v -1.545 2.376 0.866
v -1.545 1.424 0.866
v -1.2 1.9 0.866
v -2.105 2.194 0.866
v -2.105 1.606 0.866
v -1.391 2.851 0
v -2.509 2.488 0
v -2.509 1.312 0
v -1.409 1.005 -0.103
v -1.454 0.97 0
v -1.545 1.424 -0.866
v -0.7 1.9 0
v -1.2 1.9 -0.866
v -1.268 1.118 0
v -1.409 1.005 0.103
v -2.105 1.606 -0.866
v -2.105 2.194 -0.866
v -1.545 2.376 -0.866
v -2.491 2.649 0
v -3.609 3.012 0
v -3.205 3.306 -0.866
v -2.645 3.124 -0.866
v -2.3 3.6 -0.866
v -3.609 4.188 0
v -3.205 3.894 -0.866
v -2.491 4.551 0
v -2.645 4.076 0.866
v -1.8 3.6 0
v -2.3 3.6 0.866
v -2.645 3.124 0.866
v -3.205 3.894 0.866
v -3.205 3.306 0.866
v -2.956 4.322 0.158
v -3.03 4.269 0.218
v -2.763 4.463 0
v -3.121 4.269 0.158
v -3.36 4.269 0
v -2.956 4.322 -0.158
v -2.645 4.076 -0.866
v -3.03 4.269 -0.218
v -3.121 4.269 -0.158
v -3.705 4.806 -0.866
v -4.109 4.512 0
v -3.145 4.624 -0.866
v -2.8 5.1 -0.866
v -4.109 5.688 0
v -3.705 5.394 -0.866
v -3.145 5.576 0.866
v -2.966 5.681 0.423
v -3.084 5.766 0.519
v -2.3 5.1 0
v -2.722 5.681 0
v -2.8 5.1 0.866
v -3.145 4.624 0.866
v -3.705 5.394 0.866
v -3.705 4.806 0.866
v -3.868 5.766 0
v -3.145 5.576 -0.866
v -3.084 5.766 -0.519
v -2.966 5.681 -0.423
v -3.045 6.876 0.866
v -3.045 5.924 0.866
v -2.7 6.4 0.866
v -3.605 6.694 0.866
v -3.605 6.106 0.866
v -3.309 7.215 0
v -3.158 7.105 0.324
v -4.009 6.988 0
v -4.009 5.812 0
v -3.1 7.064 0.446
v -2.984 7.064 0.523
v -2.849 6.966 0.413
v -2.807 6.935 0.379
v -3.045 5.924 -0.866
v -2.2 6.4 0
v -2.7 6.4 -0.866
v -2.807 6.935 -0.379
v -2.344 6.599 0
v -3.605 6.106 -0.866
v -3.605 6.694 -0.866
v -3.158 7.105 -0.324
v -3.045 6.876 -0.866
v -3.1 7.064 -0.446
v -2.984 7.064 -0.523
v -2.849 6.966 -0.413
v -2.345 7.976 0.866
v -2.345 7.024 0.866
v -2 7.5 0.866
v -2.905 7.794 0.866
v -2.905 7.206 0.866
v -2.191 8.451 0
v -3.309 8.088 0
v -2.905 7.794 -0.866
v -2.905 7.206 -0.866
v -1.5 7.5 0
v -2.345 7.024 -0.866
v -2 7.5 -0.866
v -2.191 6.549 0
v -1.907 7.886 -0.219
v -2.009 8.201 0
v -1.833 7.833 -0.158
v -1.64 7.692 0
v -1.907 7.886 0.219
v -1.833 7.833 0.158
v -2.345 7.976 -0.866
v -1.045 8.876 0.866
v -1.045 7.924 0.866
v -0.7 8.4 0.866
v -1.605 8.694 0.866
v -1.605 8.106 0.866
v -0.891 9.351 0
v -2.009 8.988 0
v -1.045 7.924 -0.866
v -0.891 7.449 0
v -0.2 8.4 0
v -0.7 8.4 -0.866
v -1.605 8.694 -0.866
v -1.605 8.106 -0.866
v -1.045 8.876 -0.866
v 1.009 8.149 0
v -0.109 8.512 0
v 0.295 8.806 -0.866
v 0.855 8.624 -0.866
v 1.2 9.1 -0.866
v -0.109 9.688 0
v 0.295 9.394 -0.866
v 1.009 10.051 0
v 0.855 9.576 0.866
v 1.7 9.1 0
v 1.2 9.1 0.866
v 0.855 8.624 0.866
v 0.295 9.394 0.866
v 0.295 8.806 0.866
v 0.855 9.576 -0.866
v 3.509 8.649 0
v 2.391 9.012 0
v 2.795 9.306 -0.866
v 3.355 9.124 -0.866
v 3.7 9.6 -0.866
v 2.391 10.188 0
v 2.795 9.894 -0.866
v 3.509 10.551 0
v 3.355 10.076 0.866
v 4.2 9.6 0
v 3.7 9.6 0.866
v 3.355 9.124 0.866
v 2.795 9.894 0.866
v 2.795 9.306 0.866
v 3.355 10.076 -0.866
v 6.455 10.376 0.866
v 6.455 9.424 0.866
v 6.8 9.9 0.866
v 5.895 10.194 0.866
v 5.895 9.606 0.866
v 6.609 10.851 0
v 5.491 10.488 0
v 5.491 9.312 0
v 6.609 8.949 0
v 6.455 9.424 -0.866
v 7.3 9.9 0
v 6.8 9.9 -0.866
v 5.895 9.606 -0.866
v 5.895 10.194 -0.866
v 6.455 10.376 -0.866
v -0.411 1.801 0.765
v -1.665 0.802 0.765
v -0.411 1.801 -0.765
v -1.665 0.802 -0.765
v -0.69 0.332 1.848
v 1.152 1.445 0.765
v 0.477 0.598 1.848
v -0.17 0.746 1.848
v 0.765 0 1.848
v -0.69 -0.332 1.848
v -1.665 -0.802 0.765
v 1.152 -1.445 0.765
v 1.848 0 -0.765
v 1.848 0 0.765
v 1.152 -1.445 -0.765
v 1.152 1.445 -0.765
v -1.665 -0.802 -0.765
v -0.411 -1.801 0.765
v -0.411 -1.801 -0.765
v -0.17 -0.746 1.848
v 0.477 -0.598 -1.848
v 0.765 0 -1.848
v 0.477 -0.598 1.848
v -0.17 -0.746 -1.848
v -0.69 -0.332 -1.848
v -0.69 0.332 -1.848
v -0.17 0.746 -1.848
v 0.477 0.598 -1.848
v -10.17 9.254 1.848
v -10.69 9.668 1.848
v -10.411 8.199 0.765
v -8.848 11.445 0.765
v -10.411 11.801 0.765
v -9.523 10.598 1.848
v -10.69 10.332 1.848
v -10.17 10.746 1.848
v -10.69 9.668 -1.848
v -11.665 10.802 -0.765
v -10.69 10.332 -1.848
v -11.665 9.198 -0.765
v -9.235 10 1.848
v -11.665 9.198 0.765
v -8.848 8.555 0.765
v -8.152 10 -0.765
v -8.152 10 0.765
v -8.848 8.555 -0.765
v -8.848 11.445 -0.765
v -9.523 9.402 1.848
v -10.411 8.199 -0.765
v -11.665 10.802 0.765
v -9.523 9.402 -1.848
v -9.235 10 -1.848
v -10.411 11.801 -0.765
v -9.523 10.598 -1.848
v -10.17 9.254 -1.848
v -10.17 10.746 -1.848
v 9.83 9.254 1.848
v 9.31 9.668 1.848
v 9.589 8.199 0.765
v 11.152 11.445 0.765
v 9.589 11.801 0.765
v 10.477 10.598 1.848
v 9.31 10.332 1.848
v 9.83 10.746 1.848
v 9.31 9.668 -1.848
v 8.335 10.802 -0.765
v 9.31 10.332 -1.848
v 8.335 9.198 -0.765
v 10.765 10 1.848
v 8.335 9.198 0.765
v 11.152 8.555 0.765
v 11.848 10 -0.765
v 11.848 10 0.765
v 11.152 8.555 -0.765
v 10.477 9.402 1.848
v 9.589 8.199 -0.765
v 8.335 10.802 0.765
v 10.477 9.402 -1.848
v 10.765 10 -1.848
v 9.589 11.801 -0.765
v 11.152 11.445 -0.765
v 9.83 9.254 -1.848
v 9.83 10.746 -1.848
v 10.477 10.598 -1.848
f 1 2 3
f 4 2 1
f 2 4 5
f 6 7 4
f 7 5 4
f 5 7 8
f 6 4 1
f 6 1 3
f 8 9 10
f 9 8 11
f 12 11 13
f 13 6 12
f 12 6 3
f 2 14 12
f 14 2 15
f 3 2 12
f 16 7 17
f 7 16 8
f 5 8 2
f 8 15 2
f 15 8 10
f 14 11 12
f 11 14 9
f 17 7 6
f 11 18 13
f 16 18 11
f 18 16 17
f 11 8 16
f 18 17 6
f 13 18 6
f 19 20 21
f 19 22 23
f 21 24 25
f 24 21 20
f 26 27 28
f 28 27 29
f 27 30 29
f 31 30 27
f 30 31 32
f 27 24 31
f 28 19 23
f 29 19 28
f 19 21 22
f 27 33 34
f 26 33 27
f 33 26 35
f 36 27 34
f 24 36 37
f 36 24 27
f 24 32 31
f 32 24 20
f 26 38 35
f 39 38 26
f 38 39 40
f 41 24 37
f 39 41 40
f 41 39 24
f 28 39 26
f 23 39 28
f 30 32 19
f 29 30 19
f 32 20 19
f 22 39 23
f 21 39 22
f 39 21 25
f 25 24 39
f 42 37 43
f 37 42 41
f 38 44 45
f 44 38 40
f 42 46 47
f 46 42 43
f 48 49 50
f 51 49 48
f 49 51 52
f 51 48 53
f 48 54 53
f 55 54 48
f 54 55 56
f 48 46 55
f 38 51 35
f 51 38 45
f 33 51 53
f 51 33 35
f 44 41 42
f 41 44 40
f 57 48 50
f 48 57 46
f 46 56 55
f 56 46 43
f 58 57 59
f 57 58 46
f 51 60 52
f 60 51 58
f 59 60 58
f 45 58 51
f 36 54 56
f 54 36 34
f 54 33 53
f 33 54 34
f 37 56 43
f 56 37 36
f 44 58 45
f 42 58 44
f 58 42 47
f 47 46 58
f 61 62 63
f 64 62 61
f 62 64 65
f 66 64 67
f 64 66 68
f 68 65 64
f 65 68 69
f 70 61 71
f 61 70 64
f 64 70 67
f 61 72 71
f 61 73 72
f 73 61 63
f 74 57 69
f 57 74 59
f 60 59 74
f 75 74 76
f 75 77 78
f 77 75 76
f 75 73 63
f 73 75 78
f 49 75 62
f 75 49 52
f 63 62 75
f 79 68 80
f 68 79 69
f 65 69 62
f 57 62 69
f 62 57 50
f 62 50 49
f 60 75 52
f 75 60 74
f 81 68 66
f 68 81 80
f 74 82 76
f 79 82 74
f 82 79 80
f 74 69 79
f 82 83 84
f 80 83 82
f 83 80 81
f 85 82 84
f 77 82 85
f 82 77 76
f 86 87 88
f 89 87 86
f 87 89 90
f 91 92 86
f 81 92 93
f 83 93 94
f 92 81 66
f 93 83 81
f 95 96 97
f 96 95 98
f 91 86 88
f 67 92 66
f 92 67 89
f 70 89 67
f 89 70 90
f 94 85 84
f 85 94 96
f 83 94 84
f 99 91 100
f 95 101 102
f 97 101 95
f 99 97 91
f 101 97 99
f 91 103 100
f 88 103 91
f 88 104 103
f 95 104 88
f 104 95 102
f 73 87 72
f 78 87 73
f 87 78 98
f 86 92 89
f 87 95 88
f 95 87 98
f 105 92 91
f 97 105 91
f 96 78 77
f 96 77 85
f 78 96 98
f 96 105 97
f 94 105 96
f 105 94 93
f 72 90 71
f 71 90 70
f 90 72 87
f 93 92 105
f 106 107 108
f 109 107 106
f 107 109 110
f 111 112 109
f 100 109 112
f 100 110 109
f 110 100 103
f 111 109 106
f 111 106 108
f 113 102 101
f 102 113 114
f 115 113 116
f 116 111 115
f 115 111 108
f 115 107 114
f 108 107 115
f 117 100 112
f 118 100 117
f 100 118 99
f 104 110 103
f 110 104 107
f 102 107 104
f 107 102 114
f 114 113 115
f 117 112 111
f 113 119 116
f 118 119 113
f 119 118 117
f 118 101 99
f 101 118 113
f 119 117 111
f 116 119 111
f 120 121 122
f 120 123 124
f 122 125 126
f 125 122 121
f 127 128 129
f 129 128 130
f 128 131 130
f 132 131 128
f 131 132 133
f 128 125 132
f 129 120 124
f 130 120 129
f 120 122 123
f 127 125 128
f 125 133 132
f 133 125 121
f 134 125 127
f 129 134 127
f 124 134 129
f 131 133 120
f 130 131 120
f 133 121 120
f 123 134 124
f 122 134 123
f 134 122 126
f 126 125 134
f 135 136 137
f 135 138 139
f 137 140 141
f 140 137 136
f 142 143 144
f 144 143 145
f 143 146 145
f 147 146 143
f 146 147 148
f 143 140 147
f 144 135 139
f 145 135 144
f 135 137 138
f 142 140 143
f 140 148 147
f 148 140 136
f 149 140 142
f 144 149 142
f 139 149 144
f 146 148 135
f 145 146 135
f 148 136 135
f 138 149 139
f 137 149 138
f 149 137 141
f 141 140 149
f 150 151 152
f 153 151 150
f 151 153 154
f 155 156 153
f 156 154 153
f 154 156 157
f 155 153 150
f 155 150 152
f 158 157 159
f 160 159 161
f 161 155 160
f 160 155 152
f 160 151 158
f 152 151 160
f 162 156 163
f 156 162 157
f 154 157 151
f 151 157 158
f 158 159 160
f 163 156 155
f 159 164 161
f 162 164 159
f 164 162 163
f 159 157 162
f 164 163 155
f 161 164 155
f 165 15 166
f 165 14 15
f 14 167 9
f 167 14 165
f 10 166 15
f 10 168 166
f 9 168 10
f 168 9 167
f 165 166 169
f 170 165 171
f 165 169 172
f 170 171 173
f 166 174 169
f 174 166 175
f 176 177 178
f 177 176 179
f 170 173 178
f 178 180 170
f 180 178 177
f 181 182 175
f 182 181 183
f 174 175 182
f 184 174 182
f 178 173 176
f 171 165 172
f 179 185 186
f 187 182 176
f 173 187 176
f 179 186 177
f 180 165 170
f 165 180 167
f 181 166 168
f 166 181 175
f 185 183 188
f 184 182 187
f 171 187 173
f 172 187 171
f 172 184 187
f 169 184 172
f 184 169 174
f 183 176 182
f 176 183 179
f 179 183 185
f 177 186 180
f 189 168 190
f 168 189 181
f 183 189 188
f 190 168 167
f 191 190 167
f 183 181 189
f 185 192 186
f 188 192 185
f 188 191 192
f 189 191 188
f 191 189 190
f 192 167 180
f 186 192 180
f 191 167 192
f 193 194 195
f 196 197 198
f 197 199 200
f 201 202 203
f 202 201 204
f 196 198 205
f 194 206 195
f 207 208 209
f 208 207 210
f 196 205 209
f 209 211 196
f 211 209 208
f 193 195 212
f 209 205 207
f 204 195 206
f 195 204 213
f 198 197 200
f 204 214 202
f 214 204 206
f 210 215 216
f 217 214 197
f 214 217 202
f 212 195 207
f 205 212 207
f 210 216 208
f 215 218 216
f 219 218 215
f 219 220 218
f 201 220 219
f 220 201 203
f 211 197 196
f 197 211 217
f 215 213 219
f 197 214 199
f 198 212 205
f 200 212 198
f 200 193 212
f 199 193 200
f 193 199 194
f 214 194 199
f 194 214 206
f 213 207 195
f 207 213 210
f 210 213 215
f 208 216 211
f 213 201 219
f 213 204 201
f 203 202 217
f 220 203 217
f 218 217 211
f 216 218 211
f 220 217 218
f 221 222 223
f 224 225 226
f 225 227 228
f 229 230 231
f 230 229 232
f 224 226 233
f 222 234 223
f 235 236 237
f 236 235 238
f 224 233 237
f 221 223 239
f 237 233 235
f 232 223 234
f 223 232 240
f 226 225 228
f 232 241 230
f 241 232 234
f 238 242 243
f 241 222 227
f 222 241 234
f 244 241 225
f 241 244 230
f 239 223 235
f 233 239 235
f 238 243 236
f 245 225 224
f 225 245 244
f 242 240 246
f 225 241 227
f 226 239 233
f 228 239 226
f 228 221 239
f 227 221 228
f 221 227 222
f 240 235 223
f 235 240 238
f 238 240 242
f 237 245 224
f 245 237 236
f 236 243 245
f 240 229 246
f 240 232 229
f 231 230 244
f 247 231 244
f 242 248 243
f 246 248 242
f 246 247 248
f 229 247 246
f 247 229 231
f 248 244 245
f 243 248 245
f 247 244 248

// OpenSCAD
//Pascal's triangle 

resolution=0.1;

control_p=[-10,10];

p=[[0,0],control_p,[10,10]];

//Bezier curve
function bezier_curve(p1,p2,t)=
     let(p=(1-t)*[p1.x,p1.y]+(t)*[p2.x,p2.y])
     [p.x,p.y];
//--------------------------------------

//main-------------------
function pascal(p,t)=
        pascal_inner(p,len(p),t);
//-----------------------


function pascal_inner(p,n,t)=
let(sum_p=[for(i=[0:n-2])
       bezier_curve(p[i],p[i+1],t)])
n>2? 
pascal_inner(sum_p,n-1,t):
sum_p[0];


for(t=[0:resolution:1])
translate(pascal(p,t))
    sphere(1);





// show the points-------------------------------
for(i=p)
    color("red")
    translate(i)
    sphere(2);
//----------------------------------------------
